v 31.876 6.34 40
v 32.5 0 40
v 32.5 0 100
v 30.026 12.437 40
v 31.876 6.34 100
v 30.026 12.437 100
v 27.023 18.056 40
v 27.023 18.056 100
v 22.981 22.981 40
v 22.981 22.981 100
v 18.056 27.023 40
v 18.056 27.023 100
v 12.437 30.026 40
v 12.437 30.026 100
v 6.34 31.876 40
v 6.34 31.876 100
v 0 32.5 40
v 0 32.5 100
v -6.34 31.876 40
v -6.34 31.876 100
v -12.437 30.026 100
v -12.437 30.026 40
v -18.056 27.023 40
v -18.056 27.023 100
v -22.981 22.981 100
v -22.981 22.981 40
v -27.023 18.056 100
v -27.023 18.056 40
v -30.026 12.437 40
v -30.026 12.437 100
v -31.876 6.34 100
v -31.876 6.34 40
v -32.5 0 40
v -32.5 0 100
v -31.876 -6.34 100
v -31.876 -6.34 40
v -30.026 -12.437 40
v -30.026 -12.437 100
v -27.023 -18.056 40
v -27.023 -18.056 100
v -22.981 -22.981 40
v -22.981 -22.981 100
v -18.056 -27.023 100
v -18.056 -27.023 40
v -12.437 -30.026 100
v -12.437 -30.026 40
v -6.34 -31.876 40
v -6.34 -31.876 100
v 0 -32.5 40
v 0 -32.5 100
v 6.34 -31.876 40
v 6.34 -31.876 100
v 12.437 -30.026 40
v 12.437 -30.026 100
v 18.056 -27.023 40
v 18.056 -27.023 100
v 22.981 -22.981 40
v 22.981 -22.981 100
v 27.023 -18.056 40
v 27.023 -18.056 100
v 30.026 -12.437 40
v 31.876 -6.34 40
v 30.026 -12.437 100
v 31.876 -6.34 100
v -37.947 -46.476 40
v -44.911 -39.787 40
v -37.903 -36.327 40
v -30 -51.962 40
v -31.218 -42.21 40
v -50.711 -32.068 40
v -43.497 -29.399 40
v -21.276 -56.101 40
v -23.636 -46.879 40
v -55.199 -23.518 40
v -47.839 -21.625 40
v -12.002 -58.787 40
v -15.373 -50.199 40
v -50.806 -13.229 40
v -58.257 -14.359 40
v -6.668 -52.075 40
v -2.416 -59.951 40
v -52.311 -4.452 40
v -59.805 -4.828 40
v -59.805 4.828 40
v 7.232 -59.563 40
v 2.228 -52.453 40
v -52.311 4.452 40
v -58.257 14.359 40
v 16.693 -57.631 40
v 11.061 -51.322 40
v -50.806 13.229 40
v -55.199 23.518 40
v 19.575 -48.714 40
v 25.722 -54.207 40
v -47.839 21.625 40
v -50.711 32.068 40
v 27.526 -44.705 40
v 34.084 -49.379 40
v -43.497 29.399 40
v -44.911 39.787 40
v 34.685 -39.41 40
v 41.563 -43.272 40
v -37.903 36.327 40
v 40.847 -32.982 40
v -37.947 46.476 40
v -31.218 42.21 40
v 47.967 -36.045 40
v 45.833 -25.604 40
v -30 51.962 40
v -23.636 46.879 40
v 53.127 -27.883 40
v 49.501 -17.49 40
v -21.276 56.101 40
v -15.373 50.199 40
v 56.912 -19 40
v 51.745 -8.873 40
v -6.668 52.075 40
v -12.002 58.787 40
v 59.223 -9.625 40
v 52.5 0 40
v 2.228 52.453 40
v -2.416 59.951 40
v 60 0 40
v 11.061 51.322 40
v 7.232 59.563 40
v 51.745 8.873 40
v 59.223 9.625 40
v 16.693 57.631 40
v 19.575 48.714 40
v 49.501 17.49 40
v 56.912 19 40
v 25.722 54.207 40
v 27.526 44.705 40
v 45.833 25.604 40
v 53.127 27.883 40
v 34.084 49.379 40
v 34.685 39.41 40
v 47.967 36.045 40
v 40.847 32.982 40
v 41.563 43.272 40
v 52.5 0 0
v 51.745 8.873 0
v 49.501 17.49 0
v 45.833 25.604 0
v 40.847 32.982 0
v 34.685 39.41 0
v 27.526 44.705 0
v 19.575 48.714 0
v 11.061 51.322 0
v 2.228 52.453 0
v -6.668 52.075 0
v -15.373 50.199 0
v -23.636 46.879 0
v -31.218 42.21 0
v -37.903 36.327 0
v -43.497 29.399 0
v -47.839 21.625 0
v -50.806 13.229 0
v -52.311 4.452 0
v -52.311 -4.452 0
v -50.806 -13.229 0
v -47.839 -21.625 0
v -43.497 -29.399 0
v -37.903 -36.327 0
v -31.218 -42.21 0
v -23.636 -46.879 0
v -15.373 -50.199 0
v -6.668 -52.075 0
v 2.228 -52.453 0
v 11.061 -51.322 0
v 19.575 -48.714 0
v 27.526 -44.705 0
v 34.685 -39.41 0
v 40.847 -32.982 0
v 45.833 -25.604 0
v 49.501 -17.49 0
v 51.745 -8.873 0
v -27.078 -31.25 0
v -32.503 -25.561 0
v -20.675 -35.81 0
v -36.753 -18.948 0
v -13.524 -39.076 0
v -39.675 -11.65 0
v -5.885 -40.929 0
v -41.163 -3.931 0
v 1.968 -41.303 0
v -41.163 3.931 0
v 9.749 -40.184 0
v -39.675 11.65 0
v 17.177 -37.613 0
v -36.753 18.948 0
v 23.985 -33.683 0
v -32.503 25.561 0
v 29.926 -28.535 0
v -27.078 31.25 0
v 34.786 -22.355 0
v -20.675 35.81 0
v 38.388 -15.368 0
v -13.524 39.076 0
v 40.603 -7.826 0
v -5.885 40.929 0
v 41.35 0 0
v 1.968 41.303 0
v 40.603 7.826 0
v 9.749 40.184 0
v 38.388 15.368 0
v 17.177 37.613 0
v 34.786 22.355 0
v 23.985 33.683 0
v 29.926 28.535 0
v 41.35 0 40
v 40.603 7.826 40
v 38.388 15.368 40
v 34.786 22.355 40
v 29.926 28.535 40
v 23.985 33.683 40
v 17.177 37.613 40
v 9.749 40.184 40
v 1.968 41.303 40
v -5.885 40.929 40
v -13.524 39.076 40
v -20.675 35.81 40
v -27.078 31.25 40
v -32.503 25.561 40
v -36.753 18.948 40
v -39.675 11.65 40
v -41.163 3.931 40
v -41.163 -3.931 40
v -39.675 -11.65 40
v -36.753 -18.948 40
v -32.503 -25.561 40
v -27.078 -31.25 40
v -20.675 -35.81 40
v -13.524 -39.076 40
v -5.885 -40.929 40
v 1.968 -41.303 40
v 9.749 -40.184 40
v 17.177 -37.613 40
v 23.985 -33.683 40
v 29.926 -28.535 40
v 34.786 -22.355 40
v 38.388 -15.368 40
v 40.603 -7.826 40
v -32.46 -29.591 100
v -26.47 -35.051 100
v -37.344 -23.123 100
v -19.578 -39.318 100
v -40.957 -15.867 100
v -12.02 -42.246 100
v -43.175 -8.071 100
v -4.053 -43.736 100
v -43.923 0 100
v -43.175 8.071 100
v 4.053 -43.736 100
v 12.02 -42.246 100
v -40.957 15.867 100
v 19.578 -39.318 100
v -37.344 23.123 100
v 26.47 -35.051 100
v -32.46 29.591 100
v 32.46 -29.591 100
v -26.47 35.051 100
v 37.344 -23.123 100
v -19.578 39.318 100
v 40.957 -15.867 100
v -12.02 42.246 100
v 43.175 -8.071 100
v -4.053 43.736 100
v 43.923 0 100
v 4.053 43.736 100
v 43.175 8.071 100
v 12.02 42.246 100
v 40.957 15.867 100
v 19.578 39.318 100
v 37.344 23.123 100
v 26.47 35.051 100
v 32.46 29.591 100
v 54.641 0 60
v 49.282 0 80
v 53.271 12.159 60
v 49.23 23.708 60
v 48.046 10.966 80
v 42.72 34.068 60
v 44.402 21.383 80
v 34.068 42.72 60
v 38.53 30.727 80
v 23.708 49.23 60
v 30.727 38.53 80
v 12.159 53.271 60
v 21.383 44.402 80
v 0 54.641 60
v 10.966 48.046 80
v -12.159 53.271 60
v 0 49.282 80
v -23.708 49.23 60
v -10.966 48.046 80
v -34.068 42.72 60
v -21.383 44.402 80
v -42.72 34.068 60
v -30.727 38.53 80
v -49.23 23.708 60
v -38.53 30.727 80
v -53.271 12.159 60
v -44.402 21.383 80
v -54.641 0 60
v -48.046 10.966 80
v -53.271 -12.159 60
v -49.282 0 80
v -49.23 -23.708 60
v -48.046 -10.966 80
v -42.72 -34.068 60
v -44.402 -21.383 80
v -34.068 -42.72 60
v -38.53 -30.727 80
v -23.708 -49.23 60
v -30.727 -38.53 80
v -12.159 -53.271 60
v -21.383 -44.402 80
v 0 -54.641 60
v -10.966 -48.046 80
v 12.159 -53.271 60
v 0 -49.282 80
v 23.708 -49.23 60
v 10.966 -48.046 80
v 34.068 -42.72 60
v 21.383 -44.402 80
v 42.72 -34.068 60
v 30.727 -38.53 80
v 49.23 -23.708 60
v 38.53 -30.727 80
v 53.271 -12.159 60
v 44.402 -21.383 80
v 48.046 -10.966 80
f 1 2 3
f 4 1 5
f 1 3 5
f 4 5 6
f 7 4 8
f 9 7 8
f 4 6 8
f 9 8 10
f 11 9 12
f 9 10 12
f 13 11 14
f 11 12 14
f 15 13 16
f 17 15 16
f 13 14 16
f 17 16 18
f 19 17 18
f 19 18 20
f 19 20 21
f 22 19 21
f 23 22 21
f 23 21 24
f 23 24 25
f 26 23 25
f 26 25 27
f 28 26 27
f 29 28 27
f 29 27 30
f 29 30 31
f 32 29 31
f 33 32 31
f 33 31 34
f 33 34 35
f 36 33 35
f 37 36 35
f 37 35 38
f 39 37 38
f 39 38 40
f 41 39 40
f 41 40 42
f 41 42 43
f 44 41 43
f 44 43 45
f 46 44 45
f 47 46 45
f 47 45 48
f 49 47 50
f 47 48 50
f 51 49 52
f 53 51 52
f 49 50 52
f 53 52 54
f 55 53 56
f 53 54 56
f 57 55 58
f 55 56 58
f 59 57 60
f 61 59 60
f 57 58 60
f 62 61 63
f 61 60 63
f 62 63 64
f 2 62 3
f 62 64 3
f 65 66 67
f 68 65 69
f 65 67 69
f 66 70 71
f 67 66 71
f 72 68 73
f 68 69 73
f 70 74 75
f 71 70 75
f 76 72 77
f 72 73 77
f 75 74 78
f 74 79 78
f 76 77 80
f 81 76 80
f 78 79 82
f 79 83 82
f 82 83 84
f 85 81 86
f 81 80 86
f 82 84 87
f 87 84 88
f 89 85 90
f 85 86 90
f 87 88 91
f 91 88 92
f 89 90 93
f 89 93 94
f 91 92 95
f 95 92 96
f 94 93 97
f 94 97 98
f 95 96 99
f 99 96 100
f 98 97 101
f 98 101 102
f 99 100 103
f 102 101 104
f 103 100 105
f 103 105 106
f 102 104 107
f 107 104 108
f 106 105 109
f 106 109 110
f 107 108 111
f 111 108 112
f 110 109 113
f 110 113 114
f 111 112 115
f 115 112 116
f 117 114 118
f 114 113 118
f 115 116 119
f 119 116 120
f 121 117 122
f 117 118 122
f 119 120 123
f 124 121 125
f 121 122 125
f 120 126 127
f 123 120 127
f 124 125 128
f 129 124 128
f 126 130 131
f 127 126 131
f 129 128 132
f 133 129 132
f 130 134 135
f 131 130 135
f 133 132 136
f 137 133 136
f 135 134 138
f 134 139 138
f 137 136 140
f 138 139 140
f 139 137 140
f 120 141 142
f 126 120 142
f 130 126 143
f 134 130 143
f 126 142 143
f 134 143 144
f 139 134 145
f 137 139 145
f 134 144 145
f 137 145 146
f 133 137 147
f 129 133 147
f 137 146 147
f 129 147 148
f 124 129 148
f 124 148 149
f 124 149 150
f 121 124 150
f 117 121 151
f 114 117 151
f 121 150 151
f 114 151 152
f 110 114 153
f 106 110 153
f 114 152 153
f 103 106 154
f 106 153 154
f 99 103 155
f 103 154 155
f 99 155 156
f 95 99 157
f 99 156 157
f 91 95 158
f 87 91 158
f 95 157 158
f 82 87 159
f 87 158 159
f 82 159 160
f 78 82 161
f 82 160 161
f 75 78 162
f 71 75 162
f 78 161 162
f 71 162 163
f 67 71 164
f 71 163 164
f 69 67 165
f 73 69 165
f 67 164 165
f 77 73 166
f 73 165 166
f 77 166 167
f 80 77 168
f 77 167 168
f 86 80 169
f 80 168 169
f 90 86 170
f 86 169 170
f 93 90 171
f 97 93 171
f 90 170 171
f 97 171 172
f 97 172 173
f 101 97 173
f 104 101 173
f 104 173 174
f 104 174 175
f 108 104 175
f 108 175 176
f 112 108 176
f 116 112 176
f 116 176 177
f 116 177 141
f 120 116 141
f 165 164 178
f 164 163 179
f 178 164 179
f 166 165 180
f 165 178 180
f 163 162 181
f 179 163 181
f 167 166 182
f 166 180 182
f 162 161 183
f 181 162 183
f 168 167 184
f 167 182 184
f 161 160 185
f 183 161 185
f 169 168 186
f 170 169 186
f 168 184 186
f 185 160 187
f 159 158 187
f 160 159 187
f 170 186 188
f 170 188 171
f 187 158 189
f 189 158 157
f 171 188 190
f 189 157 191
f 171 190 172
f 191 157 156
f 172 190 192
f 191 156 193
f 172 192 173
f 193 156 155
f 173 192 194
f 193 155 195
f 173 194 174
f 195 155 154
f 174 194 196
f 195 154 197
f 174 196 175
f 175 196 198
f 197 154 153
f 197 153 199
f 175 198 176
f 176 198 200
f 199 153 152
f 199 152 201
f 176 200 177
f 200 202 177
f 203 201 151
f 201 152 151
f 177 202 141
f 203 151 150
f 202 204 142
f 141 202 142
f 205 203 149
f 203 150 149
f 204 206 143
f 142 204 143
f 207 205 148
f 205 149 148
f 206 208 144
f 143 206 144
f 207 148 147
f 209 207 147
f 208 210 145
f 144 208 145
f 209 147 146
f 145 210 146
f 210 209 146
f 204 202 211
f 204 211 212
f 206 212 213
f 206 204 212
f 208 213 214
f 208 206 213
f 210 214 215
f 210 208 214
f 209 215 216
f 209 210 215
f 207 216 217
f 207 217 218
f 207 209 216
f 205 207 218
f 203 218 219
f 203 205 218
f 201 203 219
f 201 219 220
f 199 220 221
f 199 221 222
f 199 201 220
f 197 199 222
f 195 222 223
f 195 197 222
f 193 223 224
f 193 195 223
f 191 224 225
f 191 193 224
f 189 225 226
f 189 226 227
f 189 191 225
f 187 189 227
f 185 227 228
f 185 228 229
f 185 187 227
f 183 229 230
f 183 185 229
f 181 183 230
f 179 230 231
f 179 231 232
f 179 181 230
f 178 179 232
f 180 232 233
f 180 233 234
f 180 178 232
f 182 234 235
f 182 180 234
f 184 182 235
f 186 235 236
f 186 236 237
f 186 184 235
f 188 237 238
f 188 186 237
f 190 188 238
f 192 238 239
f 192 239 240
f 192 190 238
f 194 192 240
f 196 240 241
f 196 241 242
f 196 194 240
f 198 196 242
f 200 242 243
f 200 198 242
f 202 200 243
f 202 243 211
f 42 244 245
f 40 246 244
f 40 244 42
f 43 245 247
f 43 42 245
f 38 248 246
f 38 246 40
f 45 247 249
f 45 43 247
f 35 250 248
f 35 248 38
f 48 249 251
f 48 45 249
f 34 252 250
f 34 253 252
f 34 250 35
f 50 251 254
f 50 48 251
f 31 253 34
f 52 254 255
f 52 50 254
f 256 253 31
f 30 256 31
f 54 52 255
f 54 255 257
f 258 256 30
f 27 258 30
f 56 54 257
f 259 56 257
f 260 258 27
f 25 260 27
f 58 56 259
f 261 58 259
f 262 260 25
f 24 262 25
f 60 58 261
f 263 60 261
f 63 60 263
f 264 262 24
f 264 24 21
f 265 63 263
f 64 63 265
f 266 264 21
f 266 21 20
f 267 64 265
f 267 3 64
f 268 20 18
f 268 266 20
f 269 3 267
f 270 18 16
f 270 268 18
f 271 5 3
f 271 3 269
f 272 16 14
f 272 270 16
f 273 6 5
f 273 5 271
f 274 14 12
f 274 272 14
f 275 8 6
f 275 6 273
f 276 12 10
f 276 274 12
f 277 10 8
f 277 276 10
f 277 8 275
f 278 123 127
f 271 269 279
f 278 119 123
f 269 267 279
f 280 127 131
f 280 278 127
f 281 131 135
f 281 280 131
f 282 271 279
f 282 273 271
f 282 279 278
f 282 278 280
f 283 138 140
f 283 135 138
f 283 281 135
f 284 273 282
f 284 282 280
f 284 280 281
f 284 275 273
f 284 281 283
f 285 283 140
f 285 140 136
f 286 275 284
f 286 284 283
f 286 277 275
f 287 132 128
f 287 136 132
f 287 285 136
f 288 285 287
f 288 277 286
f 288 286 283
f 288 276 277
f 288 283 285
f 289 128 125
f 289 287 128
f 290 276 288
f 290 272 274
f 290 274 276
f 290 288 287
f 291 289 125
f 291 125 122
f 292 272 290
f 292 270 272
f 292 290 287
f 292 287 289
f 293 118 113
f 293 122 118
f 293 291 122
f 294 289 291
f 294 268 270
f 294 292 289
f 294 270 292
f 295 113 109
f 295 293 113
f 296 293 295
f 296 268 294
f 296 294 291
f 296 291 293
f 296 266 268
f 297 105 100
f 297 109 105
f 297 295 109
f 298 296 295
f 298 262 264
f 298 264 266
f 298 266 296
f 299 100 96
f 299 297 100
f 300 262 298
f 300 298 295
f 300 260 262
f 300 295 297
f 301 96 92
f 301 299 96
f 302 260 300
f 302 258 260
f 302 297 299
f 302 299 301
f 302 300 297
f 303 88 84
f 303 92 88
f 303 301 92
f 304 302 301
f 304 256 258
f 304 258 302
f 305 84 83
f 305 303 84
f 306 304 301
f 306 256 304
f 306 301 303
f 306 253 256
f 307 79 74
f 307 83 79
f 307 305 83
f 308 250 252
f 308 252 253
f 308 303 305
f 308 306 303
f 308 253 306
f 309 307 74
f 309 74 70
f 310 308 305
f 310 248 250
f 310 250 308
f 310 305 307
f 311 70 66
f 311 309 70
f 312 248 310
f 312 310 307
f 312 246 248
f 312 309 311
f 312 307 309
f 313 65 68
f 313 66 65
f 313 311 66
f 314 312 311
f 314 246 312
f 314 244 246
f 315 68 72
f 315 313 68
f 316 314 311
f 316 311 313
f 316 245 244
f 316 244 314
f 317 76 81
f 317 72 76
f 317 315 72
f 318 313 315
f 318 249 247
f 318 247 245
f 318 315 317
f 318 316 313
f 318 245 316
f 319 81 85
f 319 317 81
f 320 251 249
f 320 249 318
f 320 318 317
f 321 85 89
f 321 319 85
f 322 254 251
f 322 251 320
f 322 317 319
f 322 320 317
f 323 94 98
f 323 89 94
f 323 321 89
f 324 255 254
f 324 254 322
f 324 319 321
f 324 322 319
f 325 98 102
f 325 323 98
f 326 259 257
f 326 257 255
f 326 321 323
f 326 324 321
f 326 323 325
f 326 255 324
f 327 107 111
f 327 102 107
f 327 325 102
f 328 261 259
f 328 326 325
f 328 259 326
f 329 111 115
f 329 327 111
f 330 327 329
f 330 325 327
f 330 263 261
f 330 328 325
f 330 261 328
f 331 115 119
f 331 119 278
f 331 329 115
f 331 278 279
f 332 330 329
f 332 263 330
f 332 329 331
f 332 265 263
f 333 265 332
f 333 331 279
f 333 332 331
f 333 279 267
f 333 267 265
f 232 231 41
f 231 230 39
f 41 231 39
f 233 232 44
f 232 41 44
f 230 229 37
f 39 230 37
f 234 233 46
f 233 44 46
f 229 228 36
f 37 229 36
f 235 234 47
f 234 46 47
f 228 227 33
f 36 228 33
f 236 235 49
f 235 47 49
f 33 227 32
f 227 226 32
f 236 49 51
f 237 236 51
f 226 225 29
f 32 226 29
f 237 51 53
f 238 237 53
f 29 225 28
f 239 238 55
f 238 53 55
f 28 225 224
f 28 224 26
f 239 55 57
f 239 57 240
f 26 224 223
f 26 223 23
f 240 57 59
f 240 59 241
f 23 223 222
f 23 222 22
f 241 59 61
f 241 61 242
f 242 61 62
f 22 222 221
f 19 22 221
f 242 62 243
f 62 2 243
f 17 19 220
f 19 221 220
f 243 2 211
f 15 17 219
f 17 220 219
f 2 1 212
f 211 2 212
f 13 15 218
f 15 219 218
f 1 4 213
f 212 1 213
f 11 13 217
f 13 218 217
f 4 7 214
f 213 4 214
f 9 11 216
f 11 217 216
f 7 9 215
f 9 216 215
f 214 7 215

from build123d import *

# Parameters (mm, degrees)
SKETCH3_R           = 52.5
SKETCH3_R_2         = 41.35
BOSS_EXTRUDE3_DEPTH = 40
SKETCH6_R           = 60
BOSS_EXTRUDE5_DEPTH = 60
BOSS_EXTRUDE5_TAPER = 15
SKETCH7_R           = 32.5
CUT_EXTRUDE1_DEPTH  = 132.148770486


with BuildPart() as part:
    # Sketch3 → Boss-Extrude3 (new body)
    with BuildSketch(Plane.XY):
        Circle(SKETCH3_R)
        Circle(SKETCH3_R_2, mode=Mode.SUBTRACT)
    extrude(amount=BOSS_EXTRUDE3_DEPTH)

    # Sketch6 → Boss-Extrude5 (add)
    with BuildSketch(Plane.XY.offset(40)):
        Circle(SKETCH6_R)
    extrude(amount=BOSS_EXTRUDE5_DEPTH, taper=BOSS_EXTRUDE5_TAPER)

    # Sketch7 → Cut-Extrude1 (cut, through all)
    with BuildSketch(Plane.XY.offset(100)):
        Circle(SKETCH7_R)
    extrude(amount=-CUT_EXTRUDE1_DEPTH, mode=Mode.SUBTRACT)


solid = part.part
